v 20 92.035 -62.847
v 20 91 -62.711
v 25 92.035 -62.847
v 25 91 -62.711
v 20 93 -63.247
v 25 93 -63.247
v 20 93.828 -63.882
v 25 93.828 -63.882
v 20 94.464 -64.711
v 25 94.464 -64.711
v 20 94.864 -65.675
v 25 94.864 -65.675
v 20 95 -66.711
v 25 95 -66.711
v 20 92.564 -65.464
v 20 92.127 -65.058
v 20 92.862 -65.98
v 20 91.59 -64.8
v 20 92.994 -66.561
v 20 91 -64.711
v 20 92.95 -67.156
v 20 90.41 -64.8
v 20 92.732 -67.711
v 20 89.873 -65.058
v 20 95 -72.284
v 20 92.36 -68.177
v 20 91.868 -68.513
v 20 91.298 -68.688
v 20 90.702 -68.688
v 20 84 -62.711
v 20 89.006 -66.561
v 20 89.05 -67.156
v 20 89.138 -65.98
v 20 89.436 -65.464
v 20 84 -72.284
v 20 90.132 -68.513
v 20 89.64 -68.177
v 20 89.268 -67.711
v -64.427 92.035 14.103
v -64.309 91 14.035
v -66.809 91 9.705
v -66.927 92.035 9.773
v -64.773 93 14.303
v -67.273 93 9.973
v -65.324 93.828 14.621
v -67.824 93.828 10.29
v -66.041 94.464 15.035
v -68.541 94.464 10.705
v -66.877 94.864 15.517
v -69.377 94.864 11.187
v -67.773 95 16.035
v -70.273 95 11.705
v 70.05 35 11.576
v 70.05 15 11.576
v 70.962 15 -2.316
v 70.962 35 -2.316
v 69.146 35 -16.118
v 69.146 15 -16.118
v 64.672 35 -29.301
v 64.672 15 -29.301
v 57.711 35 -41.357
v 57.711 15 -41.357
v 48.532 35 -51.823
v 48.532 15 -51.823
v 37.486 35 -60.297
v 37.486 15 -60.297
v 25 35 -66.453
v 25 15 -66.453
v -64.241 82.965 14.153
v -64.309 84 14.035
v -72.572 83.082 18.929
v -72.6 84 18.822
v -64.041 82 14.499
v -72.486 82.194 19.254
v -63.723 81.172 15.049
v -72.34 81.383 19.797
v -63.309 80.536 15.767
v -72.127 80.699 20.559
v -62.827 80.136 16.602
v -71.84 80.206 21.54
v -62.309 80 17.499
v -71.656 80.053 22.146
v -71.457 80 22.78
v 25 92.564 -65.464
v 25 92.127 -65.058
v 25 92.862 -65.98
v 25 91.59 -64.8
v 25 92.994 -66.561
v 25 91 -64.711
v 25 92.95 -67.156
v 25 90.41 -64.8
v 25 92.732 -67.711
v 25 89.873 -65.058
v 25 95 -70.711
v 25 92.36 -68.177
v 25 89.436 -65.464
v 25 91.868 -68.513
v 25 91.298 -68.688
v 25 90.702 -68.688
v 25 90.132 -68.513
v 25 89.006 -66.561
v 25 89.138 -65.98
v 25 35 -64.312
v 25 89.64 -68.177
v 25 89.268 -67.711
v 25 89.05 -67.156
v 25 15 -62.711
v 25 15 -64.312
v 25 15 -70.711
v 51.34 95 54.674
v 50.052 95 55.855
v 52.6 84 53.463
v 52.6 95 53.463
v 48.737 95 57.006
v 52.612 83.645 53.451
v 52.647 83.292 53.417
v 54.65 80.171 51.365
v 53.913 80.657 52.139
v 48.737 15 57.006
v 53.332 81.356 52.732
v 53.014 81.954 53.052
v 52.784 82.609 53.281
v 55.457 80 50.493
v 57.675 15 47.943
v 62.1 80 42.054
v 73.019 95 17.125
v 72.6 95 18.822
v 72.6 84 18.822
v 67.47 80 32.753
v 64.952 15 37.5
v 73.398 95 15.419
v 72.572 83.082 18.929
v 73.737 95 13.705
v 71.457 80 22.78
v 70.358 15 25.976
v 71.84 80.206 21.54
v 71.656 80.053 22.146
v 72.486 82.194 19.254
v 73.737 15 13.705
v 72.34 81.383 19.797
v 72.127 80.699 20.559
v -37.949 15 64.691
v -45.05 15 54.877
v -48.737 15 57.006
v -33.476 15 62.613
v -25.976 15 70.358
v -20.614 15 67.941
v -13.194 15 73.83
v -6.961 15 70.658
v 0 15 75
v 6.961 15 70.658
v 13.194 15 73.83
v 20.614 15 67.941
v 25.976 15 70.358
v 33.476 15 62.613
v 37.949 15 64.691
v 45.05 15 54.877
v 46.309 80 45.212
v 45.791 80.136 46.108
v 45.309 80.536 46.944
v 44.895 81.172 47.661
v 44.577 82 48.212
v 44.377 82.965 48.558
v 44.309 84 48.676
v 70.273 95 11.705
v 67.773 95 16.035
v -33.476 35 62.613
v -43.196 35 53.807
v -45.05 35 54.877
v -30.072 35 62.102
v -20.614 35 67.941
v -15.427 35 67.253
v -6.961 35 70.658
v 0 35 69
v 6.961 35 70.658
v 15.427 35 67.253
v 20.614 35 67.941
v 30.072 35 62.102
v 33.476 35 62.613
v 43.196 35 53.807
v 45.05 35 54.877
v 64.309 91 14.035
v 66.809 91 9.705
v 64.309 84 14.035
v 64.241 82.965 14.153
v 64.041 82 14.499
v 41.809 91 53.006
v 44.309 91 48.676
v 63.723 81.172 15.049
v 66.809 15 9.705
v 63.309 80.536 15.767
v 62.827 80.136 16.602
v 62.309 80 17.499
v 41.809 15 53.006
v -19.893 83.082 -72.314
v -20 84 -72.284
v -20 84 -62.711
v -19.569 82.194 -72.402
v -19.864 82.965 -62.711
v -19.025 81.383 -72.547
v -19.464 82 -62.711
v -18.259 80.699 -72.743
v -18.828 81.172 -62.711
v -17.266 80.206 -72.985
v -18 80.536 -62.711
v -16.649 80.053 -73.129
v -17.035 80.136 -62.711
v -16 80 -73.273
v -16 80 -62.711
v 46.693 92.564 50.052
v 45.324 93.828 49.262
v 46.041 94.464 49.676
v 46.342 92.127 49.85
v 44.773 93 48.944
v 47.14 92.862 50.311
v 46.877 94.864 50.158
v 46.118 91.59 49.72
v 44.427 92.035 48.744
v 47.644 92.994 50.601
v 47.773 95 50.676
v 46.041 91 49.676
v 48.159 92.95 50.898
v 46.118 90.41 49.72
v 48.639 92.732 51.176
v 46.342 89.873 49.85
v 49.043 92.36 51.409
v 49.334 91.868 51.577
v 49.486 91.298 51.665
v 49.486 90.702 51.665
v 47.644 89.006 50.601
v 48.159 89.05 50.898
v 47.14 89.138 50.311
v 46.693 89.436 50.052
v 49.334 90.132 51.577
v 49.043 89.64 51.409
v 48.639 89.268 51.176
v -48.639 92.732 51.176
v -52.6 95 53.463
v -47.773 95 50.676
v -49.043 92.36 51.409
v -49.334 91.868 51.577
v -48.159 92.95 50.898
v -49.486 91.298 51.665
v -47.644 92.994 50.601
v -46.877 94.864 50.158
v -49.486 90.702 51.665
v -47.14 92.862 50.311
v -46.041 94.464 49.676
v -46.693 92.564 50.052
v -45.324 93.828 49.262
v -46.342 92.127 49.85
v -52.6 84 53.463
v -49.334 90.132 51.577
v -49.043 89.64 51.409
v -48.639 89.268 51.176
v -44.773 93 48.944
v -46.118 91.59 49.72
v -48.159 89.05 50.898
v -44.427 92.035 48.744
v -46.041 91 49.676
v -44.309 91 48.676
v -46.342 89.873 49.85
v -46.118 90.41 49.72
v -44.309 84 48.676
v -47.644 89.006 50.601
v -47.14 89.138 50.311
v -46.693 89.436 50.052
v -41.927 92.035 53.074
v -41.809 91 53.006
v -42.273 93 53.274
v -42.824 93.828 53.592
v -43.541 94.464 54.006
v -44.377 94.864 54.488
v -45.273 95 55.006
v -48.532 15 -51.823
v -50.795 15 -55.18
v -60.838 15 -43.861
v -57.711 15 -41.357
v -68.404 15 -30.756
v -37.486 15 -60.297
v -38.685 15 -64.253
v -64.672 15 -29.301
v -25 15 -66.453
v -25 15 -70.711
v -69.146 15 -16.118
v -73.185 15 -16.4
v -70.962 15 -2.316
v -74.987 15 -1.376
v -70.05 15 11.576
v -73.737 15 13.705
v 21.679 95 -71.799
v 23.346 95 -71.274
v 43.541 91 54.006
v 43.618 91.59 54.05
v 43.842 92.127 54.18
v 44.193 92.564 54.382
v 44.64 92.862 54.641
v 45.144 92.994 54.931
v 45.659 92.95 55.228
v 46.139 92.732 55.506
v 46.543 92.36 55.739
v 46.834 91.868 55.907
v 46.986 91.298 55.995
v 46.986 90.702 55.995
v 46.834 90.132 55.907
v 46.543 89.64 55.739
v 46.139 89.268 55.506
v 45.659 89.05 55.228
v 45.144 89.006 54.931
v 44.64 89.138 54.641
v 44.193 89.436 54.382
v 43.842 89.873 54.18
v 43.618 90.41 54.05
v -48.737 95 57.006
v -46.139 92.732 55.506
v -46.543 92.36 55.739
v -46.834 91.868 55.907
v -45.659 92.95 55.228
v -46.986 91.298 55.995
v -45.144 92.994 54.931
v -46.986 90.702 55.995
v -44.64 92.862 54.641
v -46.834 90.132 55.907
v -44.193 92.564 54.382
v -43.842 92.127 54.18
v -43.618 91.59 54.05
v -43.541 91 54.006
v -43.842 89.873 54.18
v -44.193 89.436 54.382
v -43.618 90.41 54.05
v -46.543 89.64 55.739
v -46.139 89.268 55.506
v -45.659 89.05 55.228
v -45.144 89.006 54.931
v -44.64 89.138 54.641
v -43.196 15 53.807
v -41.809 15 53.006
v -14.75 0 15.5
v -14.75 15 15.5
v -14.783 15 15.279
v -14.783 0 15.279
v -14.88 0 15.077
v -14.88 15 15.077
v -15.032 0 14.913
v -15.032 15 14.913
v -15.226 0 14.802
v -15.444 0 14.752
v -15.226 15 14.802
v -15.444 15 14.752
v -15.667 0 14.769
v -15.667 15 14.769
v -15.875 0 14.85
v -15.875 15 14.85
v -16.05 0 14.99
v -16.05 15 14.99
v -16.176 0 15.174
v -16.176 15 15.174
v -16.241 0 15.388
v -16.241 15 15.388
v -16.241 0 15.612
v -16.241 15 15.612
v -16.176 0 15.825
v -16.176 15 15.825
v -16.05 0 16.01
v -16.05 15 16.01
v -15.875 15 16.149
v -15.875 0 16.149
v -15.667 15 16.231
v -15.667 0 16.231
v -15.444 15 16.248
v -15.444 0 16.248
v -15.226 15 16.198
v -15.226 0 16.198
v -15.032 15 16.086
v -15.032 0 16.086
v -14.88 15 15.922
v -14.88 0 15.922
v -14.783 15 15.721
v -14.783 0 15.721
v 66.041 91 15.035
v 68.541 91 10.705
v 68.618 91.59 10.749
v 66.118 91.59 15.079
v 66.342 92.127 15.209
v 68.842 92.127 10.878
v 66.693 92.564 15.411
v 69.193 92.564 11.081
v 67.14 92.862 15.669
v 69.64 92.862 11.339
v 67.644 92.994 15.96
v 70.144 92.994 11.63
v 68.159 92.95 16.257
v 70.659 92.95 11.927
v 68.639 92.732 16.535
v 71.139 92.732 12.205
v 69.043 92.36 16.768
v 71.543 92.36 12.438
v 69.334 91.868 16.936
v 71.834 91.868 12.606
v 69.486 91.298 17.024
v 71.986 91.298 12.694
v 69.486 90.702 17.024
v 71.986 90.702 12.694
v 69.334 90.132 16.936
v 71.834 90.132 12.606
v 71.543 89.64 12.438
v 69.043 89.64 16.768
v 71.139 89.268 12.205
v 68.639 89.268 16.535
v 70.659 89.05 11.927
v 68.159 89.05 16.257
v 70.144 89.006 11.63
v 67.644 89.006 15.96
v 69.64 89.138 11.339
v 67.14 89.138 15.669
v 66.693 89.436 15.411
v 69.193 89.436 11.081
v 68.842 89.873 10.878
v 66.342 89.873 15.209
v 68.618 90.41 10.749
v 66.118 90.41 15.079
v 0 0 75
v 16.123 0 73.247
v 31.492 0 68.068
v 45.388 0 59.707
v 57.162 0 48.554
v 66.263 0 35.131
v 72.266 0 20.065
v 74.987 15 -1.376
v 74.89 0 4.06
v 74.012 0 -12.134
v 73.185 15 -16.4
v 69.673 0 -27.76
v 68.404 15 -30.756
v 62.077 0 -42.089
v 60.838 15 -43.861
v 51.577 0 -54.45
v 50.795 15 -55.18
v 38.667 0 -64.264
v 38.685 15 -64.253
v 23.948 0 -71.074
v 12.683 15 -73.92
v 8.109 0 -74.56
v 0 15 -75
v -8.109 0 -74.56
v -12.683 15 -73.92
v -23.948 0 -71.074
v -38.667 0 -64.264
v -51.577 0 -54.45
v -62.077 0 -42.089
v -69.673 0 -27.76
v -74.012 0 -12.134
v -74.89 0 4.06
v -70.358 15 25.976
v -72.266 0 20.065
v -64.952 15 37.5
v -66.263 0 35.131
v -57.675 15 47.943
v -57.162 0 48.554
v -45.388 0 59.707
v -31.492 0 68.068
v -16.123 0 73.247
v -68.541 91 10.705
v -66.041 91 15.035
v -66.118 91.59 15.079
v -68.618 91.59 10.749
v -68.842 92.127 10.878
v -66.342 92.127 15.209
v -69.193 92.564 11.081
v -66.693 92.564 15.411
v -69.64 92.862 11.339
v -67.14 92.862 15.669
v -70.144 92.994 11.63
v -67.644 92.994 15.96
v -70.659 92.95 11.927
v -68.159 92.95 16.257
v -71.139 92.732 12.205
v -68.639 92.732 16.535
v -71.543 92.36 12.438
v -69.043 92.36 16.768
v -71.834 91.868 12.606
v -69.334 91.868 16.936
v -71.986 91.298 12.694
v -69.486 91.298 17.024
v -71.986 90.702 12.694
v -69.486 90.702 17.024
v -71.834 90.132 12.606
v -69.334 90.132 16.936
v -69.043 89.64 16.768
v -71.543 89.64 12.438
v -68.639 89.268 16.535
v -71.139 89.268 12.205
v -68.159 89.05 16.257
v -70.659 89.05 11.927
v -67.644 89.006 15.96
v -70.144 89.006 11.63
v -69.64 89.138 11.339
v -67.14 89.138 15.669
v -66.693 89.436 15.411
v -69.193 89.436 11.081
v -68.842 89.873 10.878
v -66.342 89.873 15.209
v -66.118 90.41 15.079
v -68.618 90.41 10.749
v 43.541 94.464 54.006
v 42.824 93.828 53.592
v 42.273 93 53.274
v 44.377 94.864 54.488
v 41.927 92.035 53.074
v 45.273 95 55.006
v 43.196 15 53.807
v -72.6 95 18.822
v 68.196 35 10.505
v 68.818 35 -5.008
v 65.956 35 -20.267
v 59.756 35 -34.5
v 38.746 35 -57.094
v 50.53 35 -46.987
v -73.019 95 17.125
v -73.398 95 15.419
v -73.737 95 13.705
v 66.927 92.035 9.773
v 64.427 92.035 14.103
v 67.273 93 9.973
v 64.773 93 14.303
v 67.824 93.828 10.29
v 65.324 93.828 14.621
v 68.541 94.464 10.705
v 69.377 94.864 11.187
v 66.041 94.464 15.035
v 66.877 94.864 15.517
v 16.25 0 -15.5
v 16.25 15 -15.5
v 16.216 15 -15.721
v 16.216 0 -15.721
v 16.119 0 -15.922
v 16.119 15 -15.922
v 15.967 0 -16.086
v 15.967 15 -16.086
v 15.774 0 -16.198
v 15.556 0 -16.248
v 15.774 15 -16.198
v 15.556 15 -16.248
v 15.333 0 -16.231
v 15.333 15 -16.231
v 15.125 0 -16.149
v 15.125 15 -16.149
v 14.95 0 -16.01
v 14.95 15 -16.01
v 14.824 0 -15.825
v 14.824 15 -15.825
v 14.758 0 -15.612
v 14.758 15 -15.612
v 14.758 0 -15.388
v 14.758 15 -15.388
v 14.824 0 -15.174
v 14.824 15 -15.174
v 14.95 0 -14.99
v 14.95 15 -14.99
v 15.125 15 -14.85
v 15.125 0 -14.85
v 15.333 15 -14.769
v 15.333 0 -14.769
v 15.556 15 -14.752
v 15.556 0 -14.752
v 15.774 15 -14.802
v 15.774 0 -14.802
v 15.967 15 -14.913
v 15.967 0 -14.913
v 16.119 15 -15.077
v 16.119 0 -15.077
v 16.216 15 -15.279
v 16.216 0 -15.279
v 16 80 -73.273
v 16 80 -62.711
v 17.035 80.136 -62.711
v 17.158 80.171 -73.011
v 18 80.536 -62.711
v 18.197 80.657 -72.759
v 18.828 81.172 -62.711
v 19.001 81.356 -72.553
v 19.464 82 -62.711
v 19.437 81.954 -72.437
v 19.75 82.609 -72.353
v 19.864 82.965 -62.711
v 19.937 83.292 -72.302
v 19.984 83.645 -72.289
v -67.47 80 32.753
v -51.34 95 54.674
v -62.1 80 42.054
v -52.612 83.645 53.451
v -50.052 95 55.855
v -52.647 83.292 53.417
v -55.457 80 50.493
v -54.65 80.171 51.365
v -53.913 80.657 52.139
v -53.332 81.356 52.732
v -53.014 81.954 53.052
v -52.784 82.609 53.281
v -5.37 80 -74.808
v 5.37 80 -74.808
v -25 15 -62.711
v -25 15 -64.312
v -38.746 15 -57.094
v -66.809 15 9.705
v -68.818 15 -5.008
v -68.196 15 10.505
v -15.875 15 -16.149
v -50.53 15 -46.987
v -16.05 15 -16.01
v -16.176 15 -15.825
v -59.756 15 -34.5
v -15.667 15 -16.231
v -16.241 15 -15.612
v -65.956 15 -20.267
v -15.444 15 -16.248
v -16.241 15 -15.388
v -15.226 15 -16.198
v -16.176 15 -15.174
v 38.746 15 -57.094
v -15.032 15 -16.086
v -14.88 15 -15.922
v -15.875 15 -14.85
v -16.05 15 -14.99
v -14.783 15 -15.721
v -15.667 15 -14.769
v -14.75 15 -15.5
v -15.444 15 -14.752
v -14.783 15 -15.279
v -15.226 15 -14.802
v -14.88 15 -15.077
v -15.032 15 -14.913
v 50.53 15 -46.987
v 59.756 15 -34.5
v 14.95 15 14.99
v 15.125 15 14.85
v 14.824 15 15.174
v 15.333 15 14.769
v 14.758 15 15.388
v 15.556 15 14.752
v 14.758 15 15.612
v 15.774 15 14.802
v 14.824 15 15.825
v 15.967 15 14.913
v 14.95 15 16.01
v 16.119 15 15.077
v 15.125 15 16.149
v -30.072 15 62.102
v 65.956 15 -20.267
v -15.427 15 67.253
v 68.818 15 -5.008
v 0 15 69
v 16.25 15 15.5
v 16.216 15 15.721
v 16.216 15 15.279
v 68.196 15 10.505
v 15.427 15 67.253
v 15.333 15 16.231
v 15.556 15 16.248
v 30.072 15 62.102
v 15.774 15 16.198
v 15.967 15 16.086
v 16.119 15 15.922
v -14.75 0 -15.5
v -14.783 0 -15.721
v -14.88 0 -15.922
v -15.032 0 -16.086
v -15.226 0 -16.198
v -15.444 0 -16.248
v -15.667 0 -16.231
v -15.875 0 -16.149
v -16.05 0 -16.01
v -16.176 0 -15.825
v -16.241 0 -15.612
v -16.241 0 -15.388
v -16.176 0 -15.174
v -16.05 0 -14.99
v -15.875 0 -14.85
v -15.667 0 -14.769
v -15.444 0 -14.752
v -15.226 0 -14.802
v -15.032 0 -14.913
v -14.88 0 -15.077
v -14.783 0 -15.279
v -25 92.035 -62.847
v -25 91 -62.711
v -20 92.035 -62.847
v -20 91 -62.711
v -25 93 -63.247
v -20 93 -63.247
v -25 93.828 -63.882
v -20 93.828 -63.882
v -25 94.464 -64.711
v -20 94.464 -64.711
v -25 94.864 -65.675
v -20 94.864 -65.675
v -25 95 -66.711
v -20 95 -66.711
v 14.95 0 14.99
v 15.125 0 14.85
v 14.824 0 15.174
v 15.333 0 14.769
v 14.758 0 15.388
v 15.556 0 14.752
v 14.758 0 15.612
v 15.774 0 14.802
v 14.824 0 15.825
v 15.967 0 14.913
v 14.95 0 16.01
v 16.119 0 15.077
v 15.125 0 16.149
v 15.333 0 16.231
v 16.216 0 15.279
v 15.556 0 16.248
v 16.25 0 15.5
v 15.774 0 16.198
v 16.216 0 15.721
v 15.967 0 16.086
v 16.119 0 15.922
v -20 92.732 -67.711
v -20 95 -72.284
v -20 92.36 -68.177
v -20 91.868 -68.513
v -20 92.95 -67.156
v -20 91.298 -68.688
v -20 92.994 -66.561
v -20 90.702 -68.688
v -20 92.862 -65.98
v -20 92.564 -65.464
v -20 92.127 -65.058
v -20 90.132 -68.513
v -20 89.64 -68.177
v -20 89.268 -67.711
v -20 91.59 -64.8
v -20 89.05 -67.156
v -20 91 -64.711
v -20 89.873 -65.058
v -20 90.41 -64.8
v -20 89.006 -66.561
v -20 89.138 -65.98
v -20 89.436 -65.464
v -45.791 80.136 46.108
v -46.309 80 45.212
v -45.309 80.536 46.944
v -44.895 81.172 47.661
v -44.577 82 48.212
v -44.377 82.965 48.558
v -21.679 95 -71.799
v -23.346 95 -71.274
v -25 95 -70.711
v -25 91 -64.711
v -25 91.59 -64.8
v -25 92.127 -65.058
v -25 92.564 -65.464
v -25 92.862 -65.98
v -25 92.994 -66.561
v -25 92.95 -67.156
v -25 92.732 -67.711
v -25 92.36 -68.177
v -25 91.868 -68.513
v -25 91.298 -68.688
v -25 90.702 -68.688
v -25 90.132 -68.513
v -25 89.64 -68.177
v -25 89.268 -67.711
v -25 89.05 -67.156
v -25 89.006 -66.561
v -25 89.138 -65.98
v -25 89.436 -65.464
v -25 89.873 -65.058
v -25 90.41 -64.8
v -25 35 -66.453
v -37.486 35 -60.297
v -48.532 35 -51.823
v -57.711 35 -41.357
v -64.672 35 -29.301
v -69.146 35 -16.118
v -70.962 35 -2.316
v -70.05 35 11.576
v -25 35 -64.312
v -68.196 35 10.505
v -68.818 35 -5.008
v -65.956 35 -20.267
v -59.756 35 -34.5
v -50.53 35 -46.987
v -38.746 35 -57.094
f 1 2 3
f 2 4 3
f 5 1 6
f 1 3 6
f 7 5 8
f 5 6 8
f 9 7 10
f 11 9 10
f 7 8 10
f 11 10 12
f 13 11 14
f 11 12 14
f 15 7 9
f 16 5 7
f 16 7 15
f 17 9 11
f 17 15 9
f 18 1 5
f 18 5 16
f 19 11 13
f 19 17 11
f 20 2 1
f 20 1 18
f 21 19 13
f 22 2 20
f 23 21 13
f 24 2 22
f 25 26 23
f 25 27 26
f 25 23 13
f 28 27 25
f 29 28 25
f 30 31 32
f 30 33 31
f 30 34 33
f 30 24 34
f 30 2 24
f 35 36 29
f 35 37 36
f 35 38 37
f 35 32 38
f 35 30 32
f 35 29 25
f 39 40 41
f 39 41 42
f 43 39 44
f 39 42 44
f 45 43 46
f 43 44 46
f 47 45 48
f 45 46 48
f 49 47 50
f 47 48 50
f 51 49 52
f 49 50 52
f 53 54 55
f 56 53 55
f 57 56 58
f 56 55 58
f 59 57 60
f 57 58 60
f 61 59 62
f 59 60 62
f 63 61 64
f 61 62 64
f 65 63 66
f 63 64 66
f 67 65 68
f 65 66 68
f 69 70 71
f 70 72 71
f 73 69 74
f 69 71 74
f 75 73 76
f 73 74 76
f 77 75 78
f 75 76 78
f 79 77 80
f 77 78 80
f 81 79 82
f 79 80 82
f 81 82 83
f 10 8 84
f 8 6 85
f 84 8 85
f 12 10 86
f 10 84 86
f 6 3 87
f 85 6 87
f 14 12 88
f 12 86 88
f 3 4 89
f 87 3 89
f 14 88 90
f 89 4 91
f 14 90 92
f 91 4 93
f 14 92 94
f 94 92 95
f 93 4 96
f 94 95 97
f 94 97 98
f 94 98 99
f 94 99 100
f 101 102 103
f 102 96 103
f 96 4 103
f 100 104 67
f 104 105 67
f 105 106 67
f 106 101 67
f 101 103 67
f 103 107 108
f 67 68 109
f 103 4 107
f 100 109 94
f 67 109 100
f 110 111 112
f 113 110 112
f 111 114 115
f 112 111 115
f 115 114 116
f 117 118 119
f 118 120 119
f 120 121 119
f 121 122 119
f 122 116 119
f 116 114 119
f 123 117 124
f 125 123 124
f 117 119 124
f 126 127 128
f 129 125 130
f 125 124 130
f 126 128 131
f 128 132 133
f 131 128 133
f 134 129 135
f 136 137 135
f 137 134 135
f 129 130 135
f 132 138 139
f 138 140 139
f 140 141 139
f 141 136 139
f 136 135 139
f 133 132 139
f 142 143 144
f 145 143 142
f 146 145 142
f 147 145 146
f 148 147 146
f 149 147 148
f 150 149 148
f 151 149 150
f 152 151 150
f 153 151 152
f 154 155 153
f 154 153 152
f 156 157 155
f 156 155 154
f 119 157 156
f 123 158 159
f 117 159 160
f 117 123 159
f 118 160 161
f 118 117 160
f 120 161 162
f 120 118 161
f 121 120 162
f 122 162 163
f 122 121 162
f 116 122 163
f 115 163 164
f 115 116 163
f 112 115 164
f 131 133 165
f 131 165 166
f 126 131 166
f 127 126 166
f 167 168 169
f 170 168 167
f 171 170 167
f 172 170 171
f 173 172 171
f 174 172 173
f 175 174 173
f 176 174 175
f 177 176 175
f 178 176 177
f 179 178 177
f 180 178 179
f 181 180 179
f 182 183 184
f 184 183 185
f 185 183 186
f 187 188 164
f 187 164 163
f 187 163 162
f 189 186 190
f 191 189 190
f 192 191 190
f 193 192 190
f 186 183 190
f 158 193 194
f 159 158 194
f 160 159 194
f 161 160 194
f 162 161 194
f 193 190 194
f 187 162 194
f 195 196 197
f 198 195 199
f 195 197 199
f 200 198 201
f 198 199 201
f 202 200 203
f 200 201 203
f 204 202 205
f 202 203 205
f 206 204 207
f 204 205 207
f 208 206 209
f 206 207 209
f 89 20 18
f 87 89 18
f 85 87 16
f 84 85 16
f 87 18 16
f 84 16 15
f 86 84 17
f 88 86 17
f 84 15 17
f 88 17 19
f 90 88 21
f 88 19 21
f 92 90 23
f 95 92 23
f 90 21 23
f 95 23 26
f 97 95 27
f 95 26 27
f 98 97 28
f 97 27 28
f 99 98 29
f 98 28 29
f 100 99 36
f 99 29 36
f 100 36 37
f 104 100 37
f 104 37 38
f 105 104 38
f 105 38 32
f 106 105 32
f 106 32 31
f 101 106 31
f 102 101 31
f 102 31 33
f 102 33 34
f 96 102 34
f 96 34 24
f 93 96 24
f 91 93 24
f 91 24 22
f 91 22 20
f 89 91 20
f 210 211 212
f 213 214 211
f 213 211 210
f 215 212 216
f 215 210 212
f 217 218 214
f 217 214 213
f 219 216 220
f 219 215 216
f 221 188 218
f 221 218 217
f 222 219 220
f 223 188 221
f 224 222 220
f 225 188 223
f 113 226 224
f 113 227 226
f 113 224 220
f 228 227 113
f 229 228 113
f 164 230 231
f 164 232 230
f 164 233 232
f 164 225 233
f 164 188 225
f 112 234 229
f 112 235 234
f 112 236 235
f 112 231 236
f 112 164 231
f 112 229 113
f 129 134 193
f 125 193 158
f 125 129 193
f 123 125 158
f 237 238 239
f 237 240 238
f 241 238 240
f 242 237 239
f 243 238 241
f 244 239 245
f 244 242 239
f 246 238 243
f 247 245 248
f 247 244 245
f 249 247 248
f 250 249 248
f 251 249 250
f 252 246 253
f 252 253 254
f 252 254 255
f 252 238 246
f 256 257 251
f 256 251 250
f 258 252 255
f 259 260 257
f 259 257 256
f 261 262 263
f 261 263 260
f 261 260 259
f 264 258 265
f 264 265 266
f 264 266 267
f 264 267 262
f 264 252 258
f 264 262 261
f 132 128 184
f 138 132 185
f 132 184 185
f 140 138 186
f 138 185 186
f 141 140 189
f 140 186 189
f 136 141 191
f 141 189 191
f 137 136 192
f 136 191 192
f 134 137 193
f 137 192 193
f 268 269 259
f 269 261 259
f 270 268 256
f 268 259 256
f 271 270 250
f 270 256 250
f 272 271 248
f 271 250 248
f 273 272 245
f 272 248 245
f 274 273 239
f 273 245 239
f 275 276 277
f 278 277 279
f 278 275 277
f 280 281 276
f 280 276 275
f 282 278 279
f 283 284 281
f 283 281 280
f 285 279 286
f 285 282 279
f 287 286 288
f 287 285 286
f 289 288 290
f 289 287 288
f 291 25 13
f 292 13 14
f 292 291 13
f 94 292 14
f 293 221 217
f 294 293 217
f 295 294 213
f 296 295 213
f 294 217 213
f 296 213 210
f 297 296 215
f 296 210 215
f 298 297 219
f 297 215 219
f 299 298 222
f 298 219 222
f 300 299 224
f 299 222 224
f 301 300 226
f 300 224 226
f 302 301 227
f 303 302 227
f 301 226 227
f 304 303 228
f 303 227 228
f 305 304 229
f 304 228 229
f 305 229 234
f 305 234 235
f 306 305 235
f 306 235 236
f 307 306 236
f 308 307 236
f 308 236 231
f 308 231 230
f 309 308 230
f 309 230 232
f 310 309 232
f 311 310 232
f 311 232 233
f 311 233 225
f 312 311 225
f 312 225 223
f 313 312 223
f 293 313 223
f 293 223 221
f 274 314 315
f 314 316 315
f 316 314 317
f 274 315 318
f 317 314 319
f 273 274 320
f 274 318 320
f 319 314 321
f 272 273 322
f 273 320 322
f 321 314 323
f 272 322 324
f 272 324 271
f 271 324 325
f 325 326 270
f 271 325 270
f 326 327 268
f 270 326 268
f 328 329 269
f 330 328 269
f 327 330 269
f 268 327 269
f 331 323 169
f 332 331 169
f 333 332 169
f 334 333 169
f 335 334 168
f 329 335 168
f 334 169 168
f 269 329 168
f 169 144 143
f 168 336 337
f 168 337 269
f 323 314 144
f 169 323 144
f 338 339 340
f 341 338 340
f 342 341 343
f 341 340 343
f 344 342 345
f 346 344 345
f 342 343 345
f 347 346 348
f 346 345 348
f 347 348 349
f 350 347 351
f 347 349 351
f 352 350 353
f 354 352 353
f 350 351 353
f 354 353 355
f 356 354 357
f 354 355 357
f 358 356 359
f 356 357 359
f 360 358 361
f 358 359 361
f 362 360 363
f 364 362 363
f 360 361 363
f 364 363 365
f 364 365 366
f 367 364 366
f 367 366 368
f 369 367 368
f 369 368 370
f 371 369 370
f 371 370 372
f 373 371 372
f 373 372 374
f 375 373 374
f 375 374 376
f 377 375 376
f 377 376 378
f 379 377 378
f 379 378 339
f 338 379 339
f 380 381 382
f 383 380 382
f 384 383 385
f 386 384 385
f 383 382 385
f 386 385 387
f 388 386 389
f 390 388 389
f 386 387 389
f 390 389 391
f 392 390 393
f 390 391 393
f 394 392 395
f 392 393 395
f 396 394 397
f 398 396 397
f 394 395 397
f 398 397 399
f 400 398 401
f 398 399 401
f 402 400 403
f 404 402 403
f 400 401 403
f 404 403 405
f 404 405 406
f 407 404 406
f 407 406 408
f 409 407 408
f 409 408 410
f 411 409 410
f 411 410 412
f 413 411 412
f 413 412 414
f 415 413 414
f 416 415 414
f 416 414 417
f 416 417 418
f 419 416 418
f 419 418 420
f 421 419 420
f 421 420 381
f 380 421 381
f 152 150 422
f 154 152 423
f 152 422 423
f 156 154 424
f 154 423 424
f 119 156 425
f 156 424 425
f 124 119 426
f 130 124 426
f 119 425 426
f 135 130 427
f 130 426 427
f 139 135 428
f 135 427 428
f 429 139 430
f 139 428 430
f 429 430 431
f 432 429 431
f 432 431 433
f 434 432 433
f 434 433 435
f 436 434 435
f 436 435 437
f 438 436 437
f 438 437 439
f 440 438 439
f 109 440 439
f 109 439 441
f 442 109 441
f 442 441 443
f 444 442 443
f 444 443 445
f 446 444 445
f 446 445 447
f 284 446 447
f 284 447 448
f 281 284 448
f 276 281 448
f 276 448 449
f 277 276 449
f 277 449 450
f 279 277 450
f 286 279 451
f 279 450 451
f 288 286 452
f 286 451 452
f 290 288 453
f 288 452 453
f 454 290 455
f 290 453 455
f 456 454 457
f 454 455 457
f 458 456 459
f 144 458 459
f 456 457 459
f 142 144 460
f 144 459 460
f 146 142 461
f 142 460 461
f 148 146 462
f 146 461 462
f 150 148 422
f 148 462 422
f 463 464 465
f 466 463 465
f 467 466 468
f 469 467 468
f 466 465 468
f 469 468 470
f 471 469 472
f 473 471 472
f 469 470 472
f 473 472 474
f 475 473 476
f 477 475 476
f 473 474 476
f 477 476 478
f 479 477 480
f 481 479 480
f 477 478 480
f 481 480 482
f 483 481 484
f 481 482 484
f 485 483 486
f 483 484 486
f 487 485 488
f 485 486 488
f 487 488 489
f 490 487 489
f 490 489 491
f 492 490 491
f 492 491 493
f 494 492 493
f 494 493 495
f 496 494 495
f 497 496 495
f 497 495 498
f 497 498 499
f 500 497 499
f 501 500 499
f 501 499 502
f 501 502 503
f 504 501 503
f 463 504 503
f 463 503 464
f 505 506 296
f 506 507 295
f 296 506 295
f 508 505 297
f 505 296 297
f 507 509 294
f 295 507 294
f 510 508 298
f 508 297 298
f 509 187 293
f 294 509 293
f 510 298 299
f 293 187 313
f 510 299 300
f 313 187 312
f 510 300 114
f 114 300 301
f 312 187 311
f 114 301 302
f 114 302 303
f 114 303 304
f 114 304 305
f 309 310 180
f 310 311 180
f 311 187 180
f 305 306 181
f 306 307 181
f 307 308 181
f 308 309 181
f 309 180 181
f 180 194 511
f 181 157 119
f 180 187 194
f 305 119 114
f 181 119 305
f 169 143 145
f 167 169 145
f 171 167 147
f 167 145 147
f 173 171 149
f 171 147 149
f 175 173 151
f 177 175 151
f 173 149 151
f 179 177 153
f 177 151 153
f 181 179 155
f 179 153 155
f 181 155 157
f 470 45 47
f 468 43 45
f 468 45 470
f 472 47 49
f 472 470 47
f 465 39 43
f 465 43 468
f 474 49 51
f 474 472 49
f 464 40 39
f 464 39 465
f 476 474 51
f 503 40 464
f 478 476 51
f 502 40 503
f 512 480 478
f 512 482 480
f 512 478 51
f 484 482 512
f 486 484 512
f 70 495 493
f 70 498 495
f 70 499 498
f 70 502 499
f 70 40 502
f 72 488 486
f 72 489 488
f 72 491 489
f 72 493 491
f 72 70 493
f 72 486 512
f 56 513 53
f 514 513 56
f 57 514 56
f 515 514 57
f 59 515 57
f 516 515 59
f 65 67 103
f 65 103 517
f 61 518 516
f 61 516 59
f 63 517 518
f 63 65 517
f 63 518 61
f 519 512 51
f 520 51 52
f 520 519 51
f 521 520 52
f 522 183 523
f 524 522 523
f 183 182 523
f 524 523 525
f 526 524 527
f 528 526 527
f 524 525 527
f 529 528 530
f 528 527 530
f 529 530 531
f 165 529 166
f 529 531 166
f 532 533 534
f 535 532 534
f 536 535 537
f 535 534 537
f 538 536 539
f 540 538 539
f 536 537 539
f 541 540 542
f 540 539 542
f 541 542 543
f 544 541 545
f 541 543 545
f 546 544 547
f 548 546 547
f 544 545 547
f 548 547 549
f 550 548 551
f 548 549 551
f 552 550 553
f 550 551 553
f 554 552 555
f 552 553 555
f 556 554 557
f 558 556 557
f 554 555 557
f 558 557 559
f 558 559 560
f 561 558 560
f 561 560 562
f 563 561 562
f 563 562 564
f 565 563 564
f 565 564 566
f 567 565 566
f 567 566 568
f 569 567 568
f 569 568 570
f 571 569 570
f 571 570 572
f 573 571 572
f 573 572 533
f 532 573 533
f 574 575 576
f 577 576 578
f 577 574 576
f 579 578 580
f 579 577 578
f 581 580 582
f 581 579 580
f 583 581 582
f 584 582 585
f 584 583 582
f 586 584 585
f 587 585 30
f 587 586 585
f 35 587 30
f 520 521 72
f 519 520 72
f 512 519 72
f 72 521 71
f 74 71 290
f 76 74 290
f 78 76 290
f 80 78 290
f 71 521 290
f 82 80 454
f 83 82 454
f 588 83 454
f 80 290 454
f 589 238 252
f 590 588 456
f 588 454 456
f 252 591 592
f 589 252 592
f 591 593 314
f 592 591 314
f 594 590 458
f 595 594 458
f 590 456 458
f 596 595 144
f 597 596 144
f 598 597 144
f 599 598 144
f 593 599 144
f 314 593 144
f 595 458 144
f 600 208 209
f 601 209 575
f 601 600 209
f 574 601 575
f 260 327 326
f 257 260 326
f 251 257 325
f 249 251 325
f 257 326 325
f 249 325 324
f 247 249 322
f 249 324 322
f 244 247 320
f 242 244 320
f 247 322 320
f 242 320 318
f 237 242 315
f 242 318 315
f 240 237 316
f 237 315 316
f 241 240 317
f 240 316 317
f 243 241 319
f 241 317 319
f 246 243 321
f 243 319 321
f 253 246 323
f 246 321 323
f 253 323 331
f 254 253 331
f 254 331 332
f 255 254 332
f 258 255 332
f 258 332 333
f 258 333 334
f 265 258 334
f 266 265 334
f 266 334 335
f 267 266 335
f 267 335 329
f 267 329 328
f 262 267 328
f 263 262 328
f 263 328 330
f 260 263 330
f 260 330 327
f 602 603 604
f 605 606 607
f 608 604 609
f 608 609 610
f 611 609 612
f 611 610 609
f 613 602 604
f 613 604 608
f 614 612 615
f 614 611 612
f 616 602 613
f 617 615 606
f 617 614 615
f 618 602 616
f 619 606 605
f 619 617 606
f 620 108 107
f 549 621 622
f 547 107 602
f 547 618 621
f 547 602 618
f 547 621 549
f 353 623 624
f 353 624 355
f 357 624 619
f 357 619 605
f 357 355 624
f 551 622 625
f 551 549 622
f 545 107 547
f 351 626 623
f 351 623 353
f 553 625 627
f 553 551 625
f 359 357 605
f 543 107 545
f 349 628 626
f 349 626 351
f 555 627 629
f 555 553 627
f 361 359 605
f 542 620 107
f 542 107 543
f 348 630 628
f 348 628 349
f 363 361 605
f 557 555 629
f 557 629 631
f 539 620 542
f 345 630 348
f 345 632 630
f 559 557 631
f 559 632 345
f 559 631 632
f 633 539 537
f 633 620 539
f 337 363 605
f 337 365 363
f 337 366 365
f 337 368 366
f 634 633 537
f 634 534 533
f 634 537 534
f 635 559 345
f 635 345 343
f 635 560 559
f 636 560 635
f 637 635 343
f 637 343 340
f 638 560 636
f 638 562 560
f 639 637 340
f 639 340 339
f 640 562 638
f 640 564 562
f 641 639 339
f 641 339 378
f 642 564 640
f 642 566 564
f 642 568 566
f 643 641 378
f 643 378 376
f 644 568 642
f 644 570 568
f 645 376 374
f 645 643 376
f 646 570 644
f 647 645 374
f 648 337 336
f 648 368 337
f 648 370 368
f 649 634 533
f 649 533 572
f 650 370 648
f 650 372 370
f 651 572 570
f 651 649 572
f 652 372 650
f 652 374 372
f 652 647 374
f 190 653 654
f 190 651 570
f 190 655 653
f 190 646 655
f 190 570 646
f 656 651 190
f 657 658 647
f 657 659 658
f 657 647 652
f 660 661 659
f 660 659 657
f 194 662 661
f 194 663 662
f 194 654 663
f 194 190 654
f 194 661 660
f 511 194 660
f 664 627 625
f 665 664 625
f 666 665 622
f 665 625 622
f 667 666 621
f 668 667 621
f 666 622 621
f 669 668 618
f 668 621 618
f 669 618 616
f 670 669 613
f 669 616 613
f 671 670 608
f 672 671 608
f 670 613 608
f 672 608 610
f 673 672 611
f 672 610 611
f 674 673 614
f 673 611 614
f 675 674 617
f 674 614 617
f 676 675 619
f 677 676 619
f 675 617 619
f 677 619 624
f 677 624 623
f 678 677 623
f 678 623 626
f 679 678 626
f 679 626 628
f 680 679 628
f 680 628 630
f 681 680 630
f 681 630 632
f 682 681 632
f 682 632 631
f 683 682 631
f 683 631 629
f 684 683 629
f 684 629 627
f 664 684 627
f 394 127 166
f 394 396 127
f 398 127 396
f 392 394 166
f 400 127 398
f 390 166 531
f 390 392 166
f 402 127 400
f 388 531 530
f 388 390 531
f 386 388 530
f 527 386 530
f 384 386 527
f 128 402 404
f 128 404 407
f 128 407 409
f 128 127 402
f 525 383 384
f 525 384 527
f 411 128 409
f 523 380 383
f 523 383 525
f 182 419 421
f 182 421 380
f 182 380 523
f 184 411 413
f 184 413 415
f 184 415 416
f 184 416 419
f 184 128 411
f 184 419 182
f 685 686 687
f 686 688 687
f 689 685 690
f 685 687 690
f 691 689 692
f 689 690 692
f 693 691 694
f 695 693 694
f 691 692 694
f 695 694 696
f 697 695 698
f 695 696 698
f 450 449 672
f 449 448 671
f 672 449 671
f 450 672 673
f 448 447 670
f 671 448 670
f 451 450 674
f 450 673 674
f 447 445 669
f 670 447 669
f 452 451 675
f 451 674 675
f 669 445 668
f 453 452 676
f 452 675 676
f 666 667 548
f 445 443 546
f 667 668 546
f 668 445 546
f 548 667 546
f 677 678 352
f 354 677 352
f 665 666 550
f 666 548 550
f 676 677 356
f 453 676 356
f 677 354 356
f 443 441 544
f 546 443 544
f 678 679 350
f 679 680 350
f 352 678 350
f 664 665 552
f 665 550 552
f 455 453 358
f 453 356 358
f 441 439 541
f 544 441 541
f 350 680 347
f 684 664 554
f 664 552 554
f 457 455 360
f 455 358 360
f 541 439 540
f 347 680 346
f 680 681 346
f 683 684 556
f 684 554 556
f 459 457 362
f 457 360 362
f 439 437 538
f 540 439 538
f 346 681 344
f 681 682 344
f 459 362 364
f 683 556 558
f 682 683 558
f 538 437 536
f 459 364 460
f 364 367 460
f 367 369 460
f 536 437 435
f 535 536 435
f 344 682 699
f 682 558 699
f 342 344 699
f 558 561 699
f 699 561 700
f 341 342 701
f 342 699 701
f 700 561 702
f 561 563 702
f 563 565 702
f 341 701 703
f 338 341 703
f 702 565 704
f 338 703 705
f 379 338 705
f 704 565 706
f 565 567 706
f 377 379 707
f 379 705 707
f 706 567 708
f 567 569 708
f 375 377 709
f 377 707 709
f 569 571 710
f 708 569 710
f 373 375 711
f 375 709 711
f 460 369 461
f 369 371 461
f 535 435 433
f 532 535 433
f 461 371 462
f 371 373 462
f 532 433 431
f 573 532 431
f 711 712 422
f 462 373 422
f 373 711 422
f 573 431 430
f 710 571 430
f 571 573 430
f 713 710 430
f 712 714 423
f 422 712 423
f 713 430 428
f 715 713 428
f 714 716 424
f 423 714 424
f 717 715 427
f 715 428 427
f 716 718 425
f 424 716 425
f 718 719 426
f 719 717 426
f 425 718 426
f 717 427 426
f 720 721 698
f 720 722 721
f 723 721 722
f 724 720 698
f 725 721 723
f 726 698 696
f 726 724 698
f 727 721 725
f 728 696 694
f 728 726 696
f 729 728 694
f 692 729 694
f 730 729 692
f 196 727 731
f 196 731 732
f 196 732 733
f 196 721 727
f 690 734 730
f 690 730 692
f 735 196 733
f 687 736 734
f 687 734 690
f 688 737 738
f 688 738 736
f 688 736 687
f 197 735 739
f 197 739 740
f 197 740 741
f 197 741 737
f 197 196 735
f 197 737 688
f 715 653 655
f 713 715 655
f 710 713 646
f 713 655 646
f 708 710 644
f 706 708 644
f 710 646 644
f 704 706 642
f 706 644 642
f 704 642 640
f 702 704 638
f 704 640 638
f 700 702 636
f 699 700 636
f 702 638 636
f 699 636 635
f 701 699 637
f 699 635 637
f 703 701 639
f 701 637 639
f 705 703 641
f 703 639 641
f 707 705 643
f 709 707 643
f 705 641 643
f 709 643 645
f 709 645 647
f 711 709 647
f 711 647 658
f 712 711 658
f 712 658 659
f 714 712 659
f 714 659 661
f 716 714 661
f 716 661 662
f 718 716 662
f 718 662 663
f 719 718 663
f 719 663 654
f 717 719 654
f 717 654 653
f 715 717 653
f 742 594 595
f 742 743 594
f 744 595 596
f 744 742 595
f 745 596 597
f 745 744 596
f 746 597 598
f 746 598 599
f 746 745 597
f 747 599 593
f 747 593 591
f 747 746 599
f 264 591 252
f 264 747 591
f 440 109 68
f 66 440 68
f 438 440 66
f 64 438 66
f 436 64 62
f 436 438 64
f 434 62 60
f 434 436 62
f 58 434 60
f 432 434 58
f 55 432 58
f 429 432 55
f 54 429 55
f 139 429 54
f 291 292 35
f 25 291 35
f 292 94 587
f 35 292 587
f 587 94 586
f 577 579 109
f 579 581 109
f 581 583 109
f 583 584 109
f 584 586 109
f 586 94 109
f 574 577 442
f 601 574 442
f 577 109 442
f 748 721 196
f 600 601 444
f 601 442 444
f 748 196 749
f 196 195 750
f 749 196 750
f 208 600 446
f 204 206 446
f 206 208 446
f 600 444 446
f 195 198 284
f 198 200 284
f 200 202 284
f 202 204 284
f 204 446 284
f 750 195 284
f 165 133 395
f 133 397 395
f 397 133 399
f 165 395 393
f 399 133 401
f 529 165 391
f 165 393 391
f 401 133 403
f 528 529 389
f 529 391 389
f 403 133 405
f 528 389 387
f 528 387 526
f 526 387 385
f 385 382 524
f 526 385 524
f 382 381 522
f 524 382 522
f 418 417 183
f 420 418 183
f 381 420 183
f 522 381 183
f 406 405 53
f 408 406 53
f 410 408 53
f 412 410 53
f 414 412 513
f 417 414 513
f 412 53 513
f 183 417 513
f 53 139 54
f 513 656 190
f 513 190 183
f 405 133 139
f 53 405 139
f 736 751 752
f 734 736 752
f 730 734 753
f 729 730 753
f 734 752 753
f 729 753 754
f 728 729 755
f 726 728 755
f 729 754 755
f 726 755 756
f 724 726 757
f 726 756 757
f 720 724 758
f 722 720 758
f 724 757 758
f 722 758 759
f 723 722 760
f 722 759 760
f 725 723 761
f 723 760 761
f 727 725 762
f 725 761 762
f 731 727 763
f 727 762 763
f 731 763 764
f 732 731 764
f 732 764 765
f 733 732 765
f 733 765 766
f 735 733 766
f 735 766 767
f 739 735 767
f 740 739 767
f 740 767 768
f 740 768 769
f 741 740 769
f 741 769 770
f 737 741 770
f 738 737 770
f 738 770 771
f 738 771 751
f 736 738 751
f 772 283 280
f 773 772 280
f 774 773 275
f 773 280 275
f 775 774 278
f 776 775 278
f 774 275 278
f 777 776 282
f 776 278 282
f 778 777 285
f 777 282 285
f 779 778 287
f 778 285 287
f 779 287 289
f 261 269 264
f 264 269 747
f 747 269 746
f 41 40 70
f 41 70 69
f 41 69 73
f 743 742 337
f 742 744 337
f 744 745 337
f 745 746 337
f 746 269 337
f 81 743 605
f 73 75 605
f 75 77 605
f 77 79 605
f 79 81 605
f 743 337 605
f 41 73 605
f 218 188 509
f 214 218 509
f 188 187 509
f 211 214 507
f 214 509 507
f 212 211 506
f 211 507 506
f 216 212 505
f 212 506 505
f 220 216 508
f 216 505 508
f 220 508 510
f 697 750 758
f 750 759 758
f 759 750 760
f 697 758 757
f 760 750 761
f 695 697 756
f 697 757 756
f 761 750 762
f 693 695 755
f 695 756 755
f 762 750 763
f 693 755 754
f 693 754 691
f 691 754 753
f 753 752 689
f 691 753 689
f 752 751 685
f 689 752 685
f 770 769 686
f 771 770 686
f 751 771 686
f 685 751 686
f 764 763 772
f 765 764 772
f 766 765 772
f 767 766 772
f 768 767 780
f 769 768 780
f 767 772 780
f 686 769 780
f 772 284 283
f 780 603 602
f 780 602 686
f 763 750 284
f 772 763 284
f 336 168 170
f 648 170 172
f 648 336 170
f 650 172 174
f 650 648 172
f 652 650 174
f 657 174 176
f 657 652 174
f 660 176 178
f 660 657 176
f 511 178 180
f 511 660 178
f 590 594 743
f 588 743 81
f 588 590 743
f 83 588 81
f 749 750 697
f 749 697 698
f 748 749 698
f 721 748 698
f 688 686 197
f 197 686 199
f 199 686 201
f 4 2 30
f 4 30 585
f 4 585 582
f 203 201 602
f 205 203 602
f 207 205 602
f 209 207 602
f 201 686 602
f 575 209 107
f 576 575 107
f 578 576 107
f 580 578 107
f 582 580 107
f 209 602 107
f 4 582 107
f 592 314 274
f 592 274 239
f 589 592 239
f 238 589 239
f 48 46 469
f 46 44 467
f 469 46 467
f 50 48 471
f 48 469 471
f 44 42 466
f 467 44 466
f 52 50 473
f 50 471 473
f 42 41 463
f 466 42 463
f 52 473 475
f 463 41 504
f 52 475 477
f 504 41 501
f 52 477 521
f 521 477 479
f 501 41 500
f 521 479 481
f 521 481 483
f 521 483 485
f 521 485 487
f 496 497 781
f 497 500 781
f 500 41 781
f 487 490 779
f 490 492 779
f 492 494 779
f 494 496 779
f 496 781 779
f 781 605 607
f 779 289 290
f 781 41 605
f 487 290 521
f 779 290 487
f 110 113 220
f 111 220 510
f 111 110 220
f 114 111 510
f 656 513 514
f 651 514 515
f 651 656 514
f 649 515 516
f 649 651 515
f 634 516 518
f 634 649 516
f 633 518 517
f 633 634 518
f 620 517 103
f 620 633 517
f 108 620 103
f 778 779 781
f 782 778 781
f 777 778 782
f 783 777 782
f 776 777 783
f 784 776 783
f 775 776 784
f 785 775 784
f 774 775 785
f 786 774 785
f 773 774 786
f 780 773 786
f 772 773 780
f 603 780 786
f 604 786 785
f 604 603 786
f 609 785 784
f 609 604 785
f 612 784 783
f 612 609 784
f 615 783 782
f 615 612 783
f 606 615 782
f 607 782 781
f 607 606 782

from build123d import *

# Parameters (mm, degrees)
SKETCH1_R                 = 75
BOSS_EXTRUDE1_DEPTH       = 15
BOSS_EXTRUDE2_DEPTH       = 80
CUT_EXTRUDE1_START        = -15
CUT_EXTRUDE1_DEPTH        = 15
F_4_0_MM_DOWEL_HOLES1_D   = 4
FILLET1_R                 = 4
FILLET2_R                 = 4
CIRPATTERN1_COUNT         = 3
FILLET1_OF_CIRPATTERN1_R  = 4
FILLET2_OF_CIRPATTERN1_R  = 4
FORI_ALESATO_1_5MM2_D     = 1.5
SCHIZZO8_R                = 71
SCHIZZO8_R_2              = 69
ESTRUSIONE_SOTTILE1_DEPTH = 20


with BuildPart() as part:
    # Sketch1 → Boss-Extrude1 (new body)
    with BuildSketch(Plane(origin=(0, 0, 0), x_dir=(1, 0, 0), z_dir=(0, 1, 0))):
        with Locations(Location((0, 0, 0), (0, 0, 270))):
            Circle(SKETCH1_R)
    extrude(amount=BOSS_EXTRUDE1_DEPTH)

    # Sketch2 → Boss-Extrude2 (add)
    with BuildSketch(Plane(origin=(0, 15, 0), x_dir=(1, 0, 0), z_dir=(0, 1, 0))):
        with BuildLine():
            Line((-25, 70.710678119), (-25, 62.710678119))
            Line((-25, 62.710678119), (25, 62.710678119))
            Line((25, 62.710678119), (25, 70.710678119))
            ThreePointArc((25, 70.710678119), (0, 75), (-25, 70.710678119))
        make_face()
    boss_extrude2 = extrude(amount=BOSS_EXTRUDE2_DEPTH)

    # Sketch3 → Cut-Extrude1 (cut)
    with BuildSketch(Plane(origin=(0, 95, 0), x_dir=(1, 0, 0), z_dir=(0, 1, 0)).offset(CUT_EXTRUDE1_START)):
        with BuildLine():
            Line((-20, 72.284161474), (-20, 62.710678119))
            Line((-20, 62.710678119), (20, 62.710678119))
            Line((20, 62.710678119), (20, 72.284161474))
            ThreePointArc((20, 72.284161474), (0, 75), (-20, 72.284161474))
        make_face()
    cut_extrude1 = extrude(amount=CUT_EXTRUDE1_DEPTH, mode=Mode.SUBTRACT)

    # Ø4.0 mm Dowel Holes1 (through all)
    with Locations(Plane(origin=(25, 0, 0), x_dir=(0, 0, -1), z_dir=(1, 0, 0))):
        with Locations((66.710678119, 91)):
            f_4_0_mm_dowel_holes1 = Hole(F_4_0_MM_DOWEL_HOLES1_D / 2)

    # Fillet1
    fillet1_edges = [part.edges().sort_by_distance(p)[0] for p in [
        (22.5, 95, -62.710678119),
        (-22.5, 95, -62.710678119),
    ]]
    fillet(fillet1_edges, radius=FILLET1_R)

    # Fillet2
    fillet2_edges = [part.edges().sort_by_distance(p)[0] for p in [
        (20, 80, -67.497419796),
        (-20, 80, -67.497419796),
    ]]
    fillet(fillet2_edges, radius=FILLET2_R)

    # CirPattern1: Boss-Extrude2, Cut-Extrude1, Ø4.0 mm Dowel Holes1 ×3 about axis
    cirpattern1_axis = Axis((0, 0, 0), (0, 1, 0))
    add([boss_extrude2.rotate(cirpattern1_axis, i * 360 / CIRPATTERN1_COUNT) for i in range(1, CIRPATTERN1_COUNT)])
    add([cut_extrude1.rotate(cirpattern1_axis, i * 360 / CIRPATTERN1_COUNT) for i in range(1, CIRPATTERN1_COUNT)], mode=Mode.SUBTRACT)
    add([f_4_0_mm_dowel_holes1.rotate(cirpattern1_axis, i * 360 / CIRPATTERN1_COUNT) for i in range(1, CIRPATTERN1_COUNT)], mode=Mode.SUBTRACT)

    # Fillet1 of CirPattern1
    fillet1_of_cirpattern1_edges = [part.edges().sort_by_distance(p)[0] for p in [
        (-65.559040339, 95, 11.869767474),
        (-43.059040339, 95, 50.840910644),
        (43.059040339, 95, 50.840910644),
        (65.559040339, 95, 11.869767474),
    ]]
    fillet(fillet1_of_cirpattern1_edges, radius=FILLET1_OF_CIRPATTERN1_R)

    # Fillet2 of CirPattern1
    fillet2_of_cirpattern1_edges = [part.edges().sort_by_distance(p)[0] for p in [
        (-68.454480234, 80, 16.428201822),
        (-48.454480234, 80, 51.069217974),
        (48.454480234, 80, 51.069217974),
        (68.454480234, 80, 16.428201822),
    ]]
    fillet(fillet2_of_cirpattern1_edges, radius=FILLET2_OF_CIRPATTERN1_R)

    # Fori Alesato Ø1.5mm2 (through all)
    with Locations(Plane(origin=(0, 0, 0), x_dir=(-1, 0, 0), z_dir=(0, -1, 0))):
        with Locations((-15.499780644, 15.499780644), (15.499780644, -15.499780644), (-15.499780644, -15.499780644), (15.499780644, 15.499780644)):
            Hole(FORI_ALESATO_1_5MM2_D / 2)

    # Schizzo8 → Estrusione-Sottile1 (add)
    with BuildSketch(Plane(origin=(0, 15, 0), x_dir=(1, 0, 0), z_dir=(0, 1, 0))):
        Circle(SCHIZZO8_R)
        Circle(SCHIZZO8_R_2, mode=Mode.SUBTRACT)
    extrude(amount=ESTRUSIONE_SOTTILE1_DEPTH)


solid = part.part
